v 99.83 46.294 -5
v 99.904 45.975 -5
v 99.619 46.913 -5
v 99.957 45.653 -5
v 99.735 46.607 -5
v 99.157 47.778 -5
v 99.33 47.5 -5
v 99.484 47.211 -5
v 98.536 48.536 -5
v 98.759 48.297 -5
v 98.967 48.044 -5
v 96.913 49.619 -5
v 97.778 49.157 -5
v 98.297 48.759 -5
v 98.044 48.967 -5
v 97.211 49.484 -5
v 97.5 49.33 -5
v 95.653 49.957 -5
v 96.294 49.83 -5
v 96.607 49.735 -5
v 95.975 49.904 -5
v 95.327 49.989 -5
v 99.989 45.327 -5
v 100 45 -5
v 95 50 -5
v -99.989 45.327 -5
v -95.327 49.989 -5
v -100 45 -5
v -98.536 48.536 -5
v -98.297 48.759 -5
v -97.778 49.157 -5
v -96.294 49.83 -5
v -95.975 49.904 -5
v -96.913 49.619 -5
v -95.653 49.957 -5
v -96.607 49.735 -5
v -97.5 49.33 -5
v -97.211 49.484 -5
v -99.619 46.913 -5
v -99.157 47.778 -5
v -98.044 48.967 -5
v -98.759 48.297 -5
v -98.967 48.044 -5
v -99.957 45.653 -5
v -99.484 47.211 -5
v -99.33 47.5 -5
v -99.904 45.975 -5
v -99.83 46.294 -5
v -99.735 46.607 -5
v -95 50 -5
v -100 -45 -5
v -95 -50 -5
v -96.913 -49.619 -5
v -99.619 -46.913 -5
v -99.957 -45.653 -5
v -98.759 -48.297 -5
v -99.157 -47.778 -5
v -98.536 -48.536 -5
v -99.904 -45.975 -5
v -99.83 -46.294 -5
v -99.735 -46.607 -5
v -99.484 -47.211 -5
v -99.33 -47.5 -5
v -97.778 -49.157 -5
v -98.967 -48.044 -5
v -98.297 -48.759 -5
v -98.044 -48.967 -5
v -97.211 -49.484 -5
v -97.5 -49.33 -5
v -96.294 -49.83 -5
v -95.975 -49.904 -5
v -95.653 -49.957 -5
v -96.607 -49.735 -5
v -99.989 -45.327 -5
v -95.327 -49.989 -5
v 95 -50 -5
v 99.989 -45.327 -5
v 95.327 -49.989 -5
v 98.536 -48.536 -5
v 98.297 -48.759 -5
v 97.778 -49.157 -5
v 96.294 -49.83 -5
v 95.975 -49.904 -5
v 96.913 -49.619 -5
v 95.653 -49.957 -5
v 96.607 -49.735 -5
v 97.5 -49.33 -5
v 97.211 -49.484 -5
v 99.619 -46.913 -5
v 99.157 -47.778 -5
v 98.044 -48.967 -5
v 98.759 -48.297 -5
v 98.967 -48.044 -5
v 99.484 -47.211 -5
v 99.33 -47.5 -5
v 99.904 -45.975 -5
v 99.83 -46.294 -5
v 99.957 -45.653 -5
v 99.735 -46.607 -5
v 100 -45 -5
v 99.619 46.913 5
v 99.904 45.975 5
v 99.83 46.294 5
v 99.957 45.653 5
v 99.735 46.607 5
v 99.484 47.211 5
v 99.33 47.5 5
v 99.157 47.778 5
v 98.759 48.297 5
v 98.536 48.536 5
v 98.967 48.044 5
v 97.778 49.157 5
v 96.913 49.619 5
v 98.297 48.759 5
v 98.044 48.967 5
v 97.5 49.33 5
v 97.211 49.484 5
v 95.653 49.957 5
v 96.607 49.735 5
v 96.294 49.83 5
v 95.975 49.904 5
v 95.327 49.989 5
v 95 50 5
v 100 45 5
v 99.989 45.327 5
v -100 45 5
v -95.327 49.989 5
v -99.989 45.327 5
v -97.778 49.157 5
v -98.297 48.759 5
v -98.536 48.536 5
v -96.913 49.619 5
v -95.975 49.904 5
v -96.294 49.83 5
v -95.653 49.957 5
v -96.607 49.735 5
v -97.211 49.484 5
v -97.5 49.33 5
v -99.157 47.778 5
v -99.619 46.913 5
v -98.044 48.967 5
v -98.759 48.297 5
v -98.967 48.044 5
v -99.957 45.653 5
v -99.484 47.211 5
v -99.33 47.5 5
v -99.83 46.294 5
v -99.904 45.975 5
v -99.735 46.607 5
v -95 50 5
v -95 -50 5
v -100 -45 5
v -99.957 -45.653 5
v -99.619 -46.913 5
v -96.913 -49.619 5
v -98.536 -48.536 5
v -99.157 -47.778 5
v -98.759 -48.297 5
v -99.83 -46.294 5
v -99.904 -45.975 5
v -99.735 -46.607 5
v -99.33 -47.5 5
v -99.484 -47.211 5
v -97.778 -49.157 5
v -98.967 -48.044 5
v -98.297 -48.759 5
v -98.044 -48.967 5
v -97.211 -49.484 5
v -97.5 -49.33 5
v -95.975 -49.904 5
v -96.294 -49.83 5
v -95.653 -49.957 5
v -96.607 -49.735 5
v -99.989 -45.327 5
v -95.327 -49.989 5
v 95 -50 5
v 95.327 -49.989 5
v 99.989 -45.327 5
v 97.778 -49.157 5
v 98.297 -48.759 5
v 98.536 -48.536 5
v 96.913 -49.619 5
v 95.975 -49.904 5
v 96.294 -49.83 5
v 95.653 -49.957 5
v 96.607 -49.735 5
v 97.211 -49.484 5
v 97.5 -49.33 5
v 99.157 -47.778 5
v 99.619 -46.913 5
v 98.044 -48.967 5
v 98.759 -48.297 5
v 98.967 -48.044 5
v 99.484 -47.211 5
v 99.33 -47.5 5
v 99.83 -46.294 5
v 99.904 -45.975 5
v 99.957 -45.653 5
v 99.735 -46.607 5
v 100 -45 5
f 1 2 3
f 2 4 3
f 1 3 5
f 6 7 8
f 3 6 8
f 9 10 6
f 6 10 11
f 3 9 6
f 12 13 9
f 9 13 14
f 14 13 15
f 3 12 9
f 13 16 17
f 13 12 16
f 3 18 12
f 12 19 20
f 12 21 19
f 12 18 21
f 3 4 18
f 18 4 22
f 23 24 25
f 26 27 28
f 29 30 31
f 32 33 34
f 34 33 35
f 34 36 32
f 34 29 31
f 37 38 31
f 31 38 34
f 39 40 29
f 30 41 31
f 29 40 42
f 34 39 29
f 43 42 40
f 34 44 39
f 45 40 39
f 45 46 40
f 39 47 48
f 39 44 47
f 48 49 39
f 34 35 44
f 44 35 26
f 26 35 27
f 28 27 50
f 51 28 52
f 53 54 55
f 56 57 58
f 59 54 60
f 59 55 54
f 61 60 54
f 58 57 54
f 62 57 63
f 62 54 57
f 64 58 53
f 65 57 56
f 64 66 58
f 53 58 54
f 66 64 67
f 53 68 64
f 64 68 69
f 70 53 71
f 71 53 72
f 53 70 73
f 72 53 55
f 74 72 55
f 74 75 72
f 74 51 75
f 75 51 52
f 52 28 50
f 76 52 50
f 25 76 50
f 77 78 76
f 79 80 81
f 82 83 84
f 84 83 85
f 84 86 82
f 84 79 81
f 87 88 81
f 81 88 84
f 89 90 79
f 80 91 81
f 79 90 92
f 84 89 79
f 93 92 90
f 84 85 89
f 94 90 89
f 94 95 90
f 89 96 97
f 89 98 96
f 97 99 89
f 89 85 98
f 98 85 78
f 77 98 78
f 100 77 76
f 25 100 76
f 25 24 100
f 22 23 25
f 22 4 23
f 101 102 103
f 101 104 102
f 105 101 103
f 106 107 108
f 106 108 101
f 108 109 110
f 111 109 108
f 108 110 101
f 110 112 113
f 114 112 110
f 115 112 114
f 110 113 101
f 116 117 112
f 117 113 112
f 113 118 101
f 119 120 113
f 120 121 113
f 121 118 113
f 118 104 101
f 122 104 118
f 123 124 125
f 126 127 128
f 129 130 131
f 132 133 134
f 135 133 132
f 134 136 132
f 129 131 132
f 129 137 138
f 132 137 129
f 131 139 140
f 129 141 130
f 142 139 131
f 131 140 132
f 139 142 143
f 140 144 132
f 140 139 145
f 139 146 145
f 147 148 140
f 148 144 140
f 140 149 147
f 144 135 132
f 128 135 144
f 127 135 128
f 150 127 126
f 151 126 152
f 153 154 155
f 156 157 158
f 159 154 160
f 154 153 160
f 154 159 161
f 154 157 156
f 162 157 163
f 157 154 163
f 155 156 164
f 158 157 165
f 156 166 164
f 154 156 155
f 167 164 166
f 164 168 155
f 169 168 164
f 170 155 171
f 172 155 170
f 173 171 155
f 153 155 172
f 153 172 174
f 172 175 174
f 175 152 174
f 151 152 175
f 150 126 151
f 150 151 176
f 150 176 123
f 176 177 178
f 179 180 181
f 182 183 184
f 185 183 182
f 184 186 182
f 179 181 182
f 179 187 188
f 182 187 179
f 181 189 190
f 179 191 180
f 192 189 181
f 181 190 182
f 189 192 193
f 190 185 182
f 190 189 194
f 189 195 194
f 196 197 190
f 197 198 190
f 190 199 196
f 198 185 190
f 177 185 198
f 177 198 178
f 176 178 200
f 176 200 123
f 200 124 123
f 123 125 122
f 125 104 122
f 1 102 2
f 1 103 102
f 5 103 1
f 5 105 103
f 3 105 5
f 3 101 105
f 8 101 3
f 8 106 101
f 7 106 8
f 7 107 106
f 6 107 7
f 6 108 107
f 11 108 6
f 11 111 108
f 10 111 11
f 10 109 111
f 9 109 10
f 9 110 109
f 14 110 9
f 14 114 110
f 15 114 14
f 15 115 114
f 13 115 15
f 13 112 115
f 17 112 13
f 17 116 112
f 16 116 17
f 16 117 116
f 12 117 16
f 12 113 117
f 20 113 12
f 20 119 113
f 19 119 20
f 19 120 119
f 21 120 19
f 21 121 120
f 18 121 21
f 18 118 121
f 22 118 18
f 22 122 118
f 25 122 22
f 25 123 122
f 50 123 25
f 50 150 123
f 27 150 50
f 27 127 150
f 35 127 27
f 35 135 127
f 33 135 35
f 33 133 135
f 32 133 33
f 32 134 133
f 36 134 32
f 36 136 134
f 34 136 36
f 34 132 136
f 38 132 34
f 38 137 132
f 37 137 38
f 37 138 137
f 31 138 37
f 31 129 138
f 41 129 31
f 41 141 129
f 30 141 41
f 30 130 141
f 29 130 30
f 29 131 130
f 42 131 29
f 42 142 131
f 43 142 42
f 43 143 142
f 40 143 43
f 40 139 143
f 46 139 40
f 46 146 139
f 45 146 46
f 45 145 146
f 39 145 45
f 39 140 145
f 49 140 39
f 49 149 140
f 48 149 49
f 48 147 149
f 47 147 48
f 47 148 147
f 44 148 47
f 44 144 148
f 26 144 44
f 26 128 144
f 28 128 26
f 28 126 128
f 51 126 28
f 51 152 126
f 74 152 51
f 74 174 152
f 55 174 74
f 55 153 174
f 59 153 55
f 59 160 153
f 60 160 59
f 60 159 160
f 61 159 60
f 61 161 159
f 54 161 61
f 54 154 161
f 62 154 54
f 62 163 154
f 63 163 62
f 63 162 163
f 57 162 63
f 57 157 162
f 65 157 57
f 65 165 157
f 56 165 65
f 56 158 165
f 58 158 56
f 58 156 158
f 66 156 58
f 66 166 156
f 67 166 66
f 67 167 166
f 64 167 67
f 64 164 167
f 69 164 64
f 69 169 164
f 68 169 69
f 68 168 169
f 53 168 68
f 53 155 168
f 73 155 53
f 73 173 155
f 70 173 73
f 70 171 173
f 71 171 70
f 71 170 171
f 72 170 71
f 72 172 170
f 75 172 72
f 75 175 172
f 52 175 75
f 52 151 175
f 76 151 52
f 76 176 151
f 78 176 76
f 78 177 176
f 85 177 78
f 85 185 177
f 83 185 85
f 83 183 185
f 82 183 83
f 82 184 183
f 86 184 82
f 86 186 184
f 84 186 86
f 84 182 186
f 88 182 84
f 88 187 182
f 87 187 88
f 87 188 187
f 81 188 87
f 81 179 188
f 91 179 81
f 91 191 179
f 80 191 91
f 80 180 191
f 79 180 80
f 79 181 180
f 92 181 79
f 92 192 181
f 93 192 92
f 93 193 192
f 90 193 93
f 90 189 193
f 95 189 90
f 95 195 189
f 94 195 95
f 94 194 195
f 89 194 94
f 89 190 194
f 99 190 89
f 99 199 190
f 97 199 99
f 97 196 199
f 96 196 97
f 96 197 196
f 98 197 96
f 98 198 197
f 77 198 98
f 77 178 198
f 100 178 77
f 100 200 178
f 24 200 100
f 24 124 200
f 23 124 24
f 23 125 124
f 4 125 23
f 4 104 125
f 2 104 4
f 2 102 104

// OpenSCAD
// Aluminium tooling plate (generic): single connected solid, no text, no holes/cutouts

plate_length    = 200;  // mm
plate_width     = 100;  // mm
plate_thickness = 10;   // mm

// Corner rounding radius (set to 0 for sharp corners)
corner_radius = 5;      // mm

$fn = 96;

// 2D rounded rectangle helper
module rounded_rect_2d(L, W, R) {
    R2 = min(R, min(L, W)/2);
    if (R2 <= 0) {
        square([L, W], center=true);
    } else {
        minkowski() {
            square([L - 2*R2, W - 2*R2], center=true);
            circle(r=R2);
        }
    }
}

// Main plate
linear_extrude(height = plate_thickness, center = true, convexity = 10)
    rounded_rect_2d(plate_length, plate_width, corner_radius);
